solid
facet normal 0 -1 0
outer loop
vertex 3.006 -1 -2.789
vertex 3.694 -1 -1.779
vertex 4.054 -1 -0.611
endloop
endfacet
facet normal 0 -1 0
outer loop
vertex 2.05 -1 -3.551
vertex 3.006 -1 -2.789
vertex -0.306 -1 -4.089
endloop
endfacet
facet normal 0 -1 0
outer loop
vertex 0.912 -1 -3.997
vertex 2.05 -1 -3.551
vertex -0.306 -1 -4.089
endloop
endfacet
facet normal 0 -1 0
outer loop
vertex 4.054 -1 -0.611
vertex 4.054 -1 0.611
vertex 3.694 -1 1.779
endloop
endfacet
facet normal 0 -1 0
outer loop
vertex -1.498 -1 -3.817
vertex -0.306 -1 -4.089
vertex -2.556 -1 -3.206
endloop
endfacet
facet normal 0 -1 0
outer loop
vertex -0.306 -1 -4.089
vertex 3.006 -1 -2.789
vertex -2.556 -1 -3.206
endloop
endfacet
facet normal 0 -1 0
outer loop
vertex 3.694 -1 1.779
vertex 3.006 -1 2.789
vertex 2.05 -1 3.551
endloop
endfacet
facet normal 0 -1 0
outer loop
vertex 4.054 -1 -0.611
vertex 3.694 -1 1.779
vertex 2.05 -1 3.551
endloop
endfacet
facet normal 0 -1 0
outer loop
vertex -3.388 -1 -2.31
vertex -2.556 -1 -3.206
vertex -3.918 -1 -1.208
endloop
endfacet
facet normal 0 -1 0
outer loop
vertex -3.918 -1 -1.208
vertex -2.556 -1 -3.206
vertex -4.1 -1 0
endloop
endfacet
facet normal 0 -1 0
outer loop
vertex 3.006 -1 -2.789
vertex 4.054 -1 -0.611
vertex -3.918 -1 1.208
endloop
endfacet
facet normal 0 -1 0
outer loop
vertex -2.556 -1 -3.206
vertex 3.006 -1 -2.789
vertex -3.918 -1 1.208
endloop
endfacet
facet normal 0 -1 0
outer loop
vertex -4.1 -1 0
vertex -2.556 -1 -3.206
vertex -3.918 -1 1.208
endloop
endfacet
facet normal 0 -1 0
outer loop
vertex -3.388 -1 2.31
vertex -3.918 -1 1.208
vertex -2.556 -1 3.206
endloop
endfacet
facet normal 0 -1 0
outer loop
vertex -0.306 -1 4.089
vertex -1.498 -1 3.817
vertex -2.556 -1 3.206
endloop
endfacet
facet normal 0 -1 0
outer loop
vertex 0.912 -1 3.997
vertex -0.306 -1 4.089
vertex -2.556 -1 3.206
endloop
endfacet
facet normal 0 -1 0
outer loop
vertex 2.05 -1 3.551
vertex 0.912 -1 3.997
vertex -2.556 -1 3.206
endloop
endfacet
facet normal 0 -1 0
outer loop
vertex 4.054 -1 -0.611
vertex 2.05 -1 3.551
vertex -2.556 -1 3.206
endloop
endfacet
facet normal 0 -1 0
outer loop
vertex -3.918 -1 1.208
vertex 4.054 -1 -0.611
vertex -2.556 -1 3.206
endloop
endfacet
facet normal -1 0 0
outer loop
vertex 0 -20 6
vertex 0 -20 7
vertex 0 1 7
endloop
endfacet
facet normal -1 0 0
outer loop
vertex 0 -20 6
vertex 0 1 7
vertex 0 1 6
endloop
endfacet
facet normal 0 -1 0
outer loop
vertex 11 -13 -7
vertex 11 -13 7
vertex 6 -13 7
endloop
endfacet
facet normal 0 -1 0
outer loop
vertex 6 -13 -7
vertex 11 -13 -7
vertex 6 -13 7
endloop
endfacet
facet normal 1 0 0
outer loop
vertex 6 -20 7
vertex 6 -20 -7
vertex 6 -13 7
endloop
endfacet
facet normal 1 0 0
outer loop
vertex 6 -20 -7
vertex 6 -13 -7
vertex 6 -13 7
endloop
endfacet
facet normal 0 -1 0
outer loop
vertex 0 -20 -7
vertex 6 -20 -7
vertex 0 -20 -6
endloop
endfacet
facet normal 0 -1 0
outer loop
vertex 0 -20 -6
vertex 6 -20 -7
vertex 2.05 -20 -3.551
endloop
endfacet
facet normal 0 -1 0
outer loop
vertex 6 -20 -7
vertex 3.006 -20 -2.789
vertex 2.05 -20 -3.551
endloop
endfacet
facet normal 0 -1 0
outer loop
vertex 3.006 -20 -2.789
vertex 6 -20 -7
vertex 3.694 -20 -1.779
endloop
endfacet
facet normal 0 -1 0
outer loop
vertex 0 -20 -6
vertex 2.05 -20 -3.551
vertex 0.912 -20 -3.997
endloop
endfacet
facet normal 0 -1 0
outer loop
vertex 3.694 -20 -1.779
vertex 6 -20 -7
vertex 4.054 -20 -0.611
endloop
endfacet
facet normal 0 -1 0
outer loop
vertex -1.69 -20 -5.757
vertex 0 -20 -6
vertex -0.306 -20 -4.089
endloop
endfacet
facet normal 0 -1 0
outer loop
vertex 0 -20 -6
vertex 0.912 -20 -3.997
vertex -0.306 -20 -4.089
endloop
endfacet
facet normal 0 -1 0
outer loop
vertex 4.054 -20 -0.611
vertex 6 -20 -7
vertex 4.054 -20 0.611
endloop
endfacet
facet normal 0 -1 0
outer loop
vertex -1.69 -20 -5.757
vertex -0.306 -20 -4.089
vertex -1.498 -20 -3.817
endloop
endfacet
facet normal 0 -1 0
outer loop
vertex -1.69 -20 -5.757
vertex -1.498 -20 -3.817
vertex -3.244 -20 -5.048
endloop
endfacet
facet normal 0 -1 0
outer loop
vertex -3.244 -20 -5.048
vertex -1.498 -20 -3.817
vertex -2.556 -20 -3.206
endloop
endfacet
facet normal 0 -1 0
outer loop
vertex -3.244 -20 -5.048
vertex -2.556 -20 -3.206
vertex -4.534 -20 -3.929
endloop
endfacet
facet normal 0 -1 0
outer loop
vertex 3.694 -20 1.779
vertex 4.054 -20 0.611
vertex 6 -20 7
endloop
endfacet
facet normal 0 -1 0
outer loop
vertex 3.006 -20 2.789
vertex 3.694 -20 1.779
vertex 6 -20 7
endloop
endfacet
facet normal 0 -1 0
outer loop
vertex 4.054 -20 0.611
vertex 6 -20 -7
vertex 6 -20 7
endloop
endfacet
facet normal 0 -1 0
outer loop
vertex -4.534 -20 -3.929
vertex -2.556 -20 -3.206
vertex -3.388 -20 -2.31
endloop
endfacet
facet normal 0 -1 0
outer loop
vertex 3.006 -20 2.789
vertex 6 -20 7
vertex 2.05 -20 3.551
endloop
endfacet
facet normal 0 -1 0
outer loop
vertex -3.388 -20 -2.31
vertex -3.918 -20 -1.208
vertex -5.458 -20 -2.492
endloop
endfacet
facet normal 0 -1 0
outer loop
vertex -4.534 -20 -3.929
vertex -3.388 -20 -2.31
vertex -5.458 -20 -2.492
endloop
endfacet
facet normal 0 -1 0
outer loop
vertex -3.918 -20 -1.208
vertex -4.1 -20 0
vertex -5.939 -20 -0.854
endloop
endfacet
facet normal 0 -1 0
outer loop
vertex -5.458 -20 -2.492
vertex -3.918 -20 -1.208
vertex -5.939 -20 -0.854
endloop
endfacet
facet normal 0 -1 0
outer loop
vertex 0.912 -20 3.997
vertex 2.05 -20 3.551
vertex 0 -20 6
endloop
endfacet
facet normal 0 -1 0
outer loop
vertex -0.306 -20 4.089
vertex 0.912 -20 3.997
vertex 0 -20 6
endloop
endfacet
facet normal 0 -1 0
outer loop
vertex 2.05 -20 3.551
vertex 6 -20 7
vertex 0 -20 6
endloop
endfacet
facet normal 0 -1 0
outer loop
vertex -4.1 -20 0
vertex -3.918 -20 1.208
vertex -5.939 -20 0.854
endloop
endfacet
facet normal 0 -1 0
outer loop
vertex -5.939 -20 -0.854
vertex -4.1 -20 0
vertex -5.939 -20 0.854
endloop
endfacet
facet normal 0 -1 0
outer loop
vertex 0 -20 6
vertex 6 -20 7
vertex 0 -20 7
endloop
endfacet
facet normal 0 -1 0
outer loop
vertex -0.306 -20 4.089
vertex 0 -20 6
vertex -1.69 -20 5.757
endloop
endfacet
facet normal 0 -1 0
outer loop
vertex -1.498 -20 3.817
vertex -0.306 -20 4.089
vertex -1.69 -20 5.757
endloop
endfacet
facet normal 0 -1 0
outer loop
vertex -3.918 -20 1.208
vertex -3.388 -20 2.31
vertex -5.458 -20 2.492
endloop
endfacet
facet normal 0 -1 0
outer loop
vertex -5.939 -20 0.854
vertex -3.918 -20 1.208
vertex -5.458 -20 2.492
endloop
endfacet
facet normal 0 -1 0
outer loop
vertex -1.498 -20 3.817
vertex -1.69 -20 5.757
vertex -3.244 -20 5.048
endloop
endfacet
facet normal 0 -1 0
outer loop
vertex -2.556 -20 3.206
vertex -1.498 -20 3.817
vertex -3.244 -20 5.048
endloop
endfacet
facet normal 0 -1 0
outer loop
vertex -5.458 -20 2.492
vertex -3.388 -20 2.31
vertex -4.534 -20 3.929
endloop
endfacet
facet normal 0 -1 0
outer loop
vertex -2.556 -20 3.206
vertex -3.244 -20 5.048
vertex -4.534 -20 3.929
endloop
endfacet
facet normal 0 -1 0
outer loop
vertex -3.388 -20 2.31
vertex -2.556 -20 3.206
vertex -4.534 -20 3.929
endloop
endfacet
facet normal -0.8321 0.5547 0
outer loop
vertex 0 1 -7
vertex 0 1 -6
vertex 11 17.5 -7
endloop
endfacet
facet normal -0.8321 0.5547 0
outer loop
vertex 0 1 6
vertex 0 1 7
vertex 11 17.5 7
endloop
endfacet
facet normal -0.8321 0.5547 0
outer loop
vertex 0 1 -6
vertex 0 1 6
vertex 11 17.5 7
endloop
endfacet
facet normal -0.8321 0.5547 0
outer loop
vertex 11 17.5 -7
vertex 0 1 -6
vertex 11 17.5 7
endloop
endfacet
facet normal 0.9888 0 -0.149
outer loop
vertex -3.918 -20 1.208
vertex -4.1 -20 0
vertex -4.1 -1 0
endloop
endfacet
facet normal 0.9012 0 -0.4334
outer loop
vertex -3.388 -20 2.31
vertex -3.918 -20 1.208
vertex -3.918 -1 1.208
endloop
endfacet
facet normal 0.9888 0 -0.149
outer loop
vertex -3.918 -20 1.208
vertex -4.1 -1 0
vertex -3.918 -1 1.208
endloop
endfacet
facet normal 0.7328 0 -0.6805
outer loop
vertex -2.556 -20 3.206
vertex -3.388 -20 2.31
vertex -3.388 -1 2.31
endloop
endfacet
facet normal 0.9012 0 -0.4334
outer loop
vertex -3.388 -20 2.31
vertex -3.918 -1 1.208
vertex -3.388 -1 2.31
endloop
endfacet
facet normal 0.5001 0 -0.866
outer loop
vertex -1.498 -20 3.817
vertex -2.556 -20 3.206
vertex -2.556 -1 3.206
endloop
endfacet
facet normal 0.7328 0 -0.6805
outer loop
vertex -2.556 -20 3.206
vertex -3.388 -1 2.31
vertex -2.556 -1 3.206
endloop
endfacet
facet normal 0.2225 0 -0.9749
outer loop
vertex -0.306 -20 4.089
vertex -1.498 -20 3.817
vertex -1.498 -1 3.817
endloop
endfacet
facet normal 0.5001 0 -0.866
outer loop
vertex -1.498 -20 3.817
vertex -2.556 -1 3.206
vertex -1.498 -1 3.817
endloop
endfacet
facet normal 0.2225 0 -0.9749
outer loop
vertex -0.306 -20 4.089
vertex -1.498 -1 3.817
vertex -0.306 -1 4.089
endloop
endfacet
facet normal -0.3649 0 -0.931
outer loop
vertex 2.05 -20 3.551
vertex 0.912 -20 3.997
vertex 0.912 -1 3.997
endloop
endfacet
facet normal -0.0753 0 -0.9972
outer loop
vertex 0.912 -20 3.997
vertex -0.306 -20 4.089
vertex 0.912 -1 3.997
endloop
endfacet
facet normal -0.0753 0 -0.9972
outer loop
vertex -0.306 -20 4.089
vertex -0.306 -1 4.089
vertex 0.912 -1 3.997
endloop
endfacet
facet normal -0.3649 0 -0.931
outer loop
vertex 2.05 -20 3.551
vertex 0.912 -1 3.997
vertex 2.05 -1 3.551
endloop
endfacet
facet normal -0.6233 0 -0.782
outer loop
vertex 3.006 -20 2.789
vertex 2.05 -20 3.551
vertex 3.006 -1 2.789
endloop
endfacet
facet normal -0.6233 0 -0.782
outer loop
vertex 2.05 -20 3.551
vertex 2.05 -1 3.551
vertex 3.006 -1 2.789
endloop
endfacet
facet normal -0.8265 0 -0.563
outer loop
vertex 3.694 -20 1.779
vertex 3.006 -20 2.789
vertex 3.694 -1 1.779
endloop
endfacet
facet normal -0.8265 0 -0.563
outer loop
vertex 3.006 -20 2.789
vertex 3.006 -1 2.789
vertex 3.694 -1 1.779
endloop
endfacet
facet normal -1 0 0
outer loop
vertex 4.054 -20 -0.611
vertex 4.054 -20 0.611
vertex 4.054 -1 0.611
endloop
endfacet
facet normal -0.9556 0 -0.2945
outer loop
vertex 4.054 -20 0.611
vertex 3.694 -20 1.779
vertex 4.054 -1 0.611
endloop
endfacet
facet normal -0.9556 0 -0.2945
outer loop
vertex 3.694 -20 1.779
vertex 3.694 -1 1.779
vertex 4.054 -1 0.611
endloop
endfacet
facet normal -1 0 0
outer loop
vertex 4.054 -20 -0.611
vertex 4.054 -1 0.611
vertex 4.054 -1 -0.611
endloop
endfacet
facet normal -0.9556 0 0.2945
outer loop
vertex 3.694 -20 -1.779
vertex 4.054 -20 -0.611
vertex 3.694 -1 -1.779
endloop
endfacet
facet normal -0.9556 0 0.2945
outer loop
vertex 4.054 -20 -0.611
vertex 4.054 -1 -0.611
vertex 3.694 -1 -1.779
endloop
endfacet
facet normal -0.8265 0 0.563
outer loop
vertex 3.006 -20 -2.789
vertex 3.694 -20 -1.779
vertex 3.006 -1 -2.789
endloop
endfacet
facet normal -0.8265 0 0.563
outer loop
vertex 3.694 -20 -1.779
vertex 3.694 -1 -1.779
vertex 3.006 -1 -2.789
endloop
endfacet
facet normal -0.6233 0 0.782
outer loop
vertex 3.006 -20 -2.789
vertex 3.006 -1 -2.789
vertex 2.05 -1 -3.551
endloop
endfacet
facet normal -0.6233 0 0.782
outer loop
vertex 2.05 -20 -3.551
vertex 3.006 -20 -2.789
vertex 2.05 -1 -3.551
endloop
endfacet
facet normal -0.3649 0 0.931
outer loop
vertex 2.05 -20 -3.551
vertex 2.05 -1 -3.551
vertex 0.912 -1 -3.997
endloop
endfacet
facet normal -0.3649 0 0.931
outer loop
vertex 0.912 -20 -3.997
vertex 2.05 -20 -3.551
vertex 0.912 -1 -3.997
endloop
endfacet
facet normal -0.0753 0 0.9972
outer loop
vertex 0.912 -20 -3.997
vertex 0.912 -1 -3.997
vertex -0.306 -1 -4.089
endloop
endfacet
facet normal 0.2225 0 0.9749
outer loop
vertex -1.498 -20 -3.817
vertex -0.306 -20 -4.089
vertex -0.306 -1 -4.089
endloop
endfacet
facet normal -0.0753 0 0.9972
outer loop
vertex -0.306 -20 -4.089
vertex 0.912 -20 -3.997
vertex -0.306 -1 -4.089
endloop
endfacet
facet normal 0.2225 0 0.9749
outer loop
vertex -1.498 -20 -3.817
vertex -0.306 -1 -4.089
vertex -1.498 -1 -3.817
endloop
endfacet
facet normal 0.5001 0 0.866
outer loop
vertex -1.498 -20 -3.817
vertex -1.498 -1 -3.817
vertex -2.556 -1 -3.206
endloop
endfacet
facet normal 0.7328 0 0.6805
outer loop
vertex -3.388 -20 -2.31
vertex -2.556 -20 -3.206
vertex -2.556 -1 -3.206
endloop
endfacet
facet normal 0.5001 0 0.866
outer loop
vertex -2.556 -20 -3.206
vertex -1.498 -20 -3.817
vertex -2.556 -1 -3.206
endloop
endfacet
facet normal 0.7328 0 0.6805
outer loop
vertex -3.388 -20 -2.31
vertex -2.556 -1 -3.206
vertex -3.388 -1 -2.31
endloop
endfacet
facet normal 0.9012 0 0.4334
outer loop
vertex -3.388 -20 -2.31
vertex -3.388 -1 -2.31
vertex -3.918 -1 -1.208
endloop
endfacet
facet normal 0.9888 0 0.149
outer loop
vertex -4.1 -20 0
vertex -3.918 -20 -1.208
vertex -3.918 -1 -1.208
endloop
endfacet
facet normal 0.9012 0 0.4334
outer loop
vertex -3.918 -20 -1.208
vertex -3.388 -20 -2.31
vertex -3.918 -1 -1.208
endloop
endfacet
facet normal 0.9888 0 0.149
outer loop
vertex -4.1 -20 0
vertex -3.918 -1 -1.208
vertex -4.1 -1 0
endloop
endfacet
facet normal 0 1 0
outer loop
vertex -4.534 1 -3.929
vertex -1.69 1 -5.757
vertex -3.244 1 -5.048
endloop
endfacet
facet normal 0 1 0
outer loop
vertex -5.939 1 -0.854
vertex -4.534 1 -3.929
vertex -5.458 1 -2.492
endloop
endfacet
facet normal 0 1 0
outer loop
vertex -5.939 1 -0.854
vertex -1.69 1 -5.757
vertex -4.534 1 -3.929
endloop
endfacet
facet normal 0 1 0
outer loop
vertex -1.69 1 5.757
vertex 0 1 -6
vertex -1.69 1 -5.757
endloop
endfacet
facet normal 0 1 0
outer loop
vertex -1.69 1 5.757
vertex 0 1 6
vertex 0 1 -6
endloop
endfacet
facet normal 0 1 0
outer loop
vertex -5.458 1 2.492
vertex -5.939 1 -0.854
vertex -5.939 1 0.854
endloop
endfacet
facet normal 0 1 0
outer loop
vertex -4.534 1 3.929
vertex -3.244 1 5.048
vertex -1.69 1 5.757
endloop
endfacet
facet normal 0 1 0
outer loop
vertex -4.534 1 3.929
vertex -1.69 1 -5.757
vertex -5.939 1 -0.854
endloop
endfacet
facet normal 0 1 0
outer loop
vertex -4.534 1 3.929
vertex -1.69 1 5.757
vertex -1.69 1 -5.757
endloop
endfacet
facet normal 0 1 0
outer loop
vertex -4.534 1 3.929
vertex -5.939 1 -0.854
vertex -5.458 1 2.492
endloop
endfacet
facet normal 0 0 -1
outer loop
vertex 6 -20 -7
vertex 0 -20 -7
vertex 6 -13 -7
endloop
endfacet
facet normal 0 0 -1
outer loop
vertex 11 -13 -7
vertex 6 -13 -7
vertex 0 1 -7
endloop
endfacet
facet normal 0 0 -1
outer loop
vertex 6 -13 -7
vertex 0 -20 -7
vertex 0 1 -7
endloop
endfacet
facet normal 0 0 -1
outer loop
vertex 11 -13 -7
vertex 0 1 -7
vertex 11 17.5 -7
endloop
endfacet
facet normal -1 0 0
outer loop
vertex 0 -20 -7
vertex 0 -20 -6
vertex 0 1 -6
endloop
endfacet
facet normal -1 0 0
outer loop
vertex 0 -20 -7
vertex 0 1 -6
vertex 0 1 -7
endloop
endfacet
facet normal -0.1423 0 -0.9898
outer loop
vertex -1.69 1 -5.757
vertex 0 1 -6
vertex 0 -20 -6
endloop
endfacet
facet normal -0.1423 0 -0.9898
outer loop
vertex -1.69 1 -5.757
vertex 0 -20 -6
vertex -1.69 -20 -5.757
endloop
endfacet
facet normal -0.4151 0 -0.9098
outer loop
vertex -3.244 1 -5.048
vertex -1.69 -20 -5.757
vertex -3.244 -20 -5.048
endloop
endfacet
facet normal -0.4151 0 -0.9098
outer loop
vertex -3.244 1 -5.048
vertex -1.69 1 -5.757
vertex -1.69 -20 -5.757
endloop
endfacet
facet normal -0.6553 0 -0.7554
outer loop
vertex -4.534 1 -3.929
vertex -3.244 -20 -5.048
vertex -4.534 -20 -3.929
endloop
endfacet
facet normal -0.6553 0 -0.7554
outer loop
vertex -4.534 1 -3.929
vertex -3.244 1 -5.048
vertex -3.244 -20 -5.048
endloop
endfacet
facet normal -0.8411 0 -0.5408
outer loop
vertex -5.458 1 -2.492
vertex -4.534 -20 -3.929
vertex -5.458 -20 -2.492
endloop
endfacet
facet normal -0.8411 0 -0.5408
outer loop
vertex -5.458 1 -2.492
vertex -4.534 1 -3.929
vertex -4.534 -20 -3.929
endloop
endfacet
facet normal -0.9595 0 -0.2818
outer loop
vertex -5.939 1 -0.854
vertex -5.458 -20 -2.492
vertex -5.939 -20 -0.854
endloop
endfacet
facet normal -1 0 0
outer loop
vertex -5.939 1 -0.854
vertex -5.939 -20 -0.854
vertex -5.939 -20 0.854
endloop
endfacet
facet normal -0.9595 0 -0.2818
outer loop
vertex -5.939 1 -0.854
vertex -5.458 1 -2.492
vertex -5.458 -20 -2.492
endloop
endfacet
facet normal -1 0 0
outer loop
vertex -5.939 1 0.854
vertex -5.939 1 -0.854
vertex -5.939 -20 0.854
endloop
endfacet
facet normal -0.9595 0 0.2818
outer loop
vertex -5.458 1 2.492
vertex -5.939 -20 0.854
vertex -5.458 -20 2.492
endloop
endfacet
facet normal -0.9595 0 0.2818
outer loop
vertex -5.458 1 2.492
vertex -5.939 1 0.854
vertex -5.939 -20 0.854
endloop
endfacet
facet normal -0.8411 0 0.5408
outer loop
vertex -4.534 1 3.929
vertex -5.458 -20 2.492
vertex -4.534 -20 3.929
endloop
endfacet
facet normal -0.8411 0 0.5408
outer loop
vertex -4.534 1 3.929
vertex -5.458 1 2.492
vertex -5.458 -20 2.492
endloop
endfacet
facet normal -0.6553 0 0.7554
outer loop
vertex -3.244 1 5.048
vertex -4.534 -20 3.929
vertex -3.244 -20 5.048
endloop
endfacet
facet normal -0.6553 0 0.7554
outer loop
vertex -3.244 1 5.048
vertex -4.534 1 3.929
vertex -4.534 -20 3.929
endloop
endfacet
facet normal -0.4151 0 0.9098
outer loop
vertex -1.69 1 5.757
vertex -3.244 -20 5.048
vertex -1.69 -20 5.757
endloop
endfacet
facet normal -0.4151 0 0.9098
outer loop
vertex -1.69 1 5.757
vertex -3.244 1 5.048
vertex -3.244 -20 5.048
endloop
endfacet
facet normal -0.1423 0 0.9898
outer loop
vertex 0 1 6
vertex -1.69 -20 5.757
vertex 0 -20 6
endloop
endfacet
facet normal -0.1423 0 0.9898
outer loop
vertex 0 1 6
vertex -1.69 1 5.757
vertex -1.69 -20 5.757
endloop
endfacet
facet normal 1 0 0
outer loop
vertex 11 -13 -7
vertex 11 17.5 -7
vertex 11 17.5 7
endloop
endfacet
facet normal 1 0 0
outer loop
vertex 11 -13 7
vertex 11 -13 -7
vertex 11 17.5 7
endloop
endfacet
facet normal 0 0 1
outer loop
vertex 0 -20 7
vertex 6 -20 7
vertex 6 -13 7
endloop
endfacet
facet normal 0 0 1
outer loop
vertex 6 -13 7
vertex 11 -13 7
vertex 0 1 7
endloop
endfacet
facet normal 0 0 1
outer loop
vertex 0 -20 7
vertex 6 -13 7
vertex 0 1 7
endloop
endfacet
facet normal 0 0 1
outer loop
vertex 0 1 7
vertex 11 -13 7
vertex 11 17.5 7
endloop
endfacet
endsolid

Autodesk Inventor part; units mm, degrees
ref_plane "YZ Plane" through (0, 0, 0) normal (1, 0, 0) x (0, 1, 0)
ref_plane "XZ Plane" through (0, 0, 0) normal (0, 1, 0) x (-1, 0, 0)
ref_plane "XY Plane" through (0, 0, 0) normal (0, 0, 1) x (1, 0, 0)
sketch "Szkic1" plane through (0, 0, 0) normal (0, 1, 0) x (-1, 0, 0)
  circle A0 centre (0, 0) radius 4.1
  line L0 (0, 7) -> (0, -7)
  line L1 (0, -7) -> (-11, -7)
  line L2 (-11, -7) -> (-11, 7)
  line L3 (-11, 7) -> (0, 7)
  line L4 (-11, 7) -> (-6, 7)
  line L5 (-6, -7) -> (-11, -7)
  line L6 (-11, -7) -> (-11, 7)
  circle A1 centre (0, 0) radius 6
  line L7 (-6, -7) -> (-6, 7)
  point P0 (0, -6)
  point P1 (0, 6)
  point P2 (0, -4.1)
  point P3 (0, 4.1)
  point P4 (-6, 0)
  dimension "d0" = 8.2
  dimension "d1" = 14
  dimension "d2" = 11
  dimension "d3" = 7
  dimension "d6" = 0
  dimension "d7" = 5
  dimension "d8" = 12
  dimension "d15" = 5
extrude "Wyciągnięcie proste4" add sketch "Szkic1" against normal blind 20 contours A0 L0 A1 | A0 L0 A1
extrude "Wyciągnięcie proste5" add sketch "Szkic1" along normal mid plane 2 contours A0 L0 | A0 L0 A1 | L0 A0 | A0 L0 A1
extrude "Wyciągnięcie proste6" add sketch "Szkic1" along normal blind 1 contours A1 L7 L3 L0 | L0 L1 L7 A1
extrude "Wyciągnięcie proste7" add sketch "Szkic1" along normal blind 10 contours L7 L1 L2 L3
extrude "Wyciągnięcie proste8" add sketch "Szkic1" against normal blind 20 contours A1 L7 L3 L0 | L0 L1 L7 A1
extrude "Wyciągnięcie proste9" add sketch "Szkic1" against normal blind 13 contours L7 L1 L2 L3
sketch "Szkic5" plane through (0, -20, 7) normal (0, 0, 1) x (1, 0, 0)
  line L0 (6, 21) -> (0, 21) projected
  line L1 (6, 21) -> (6, 30) projected
  line L2 (0, 21) -> (6, 30)
  line L3 (6, 30) -> (11, 37.5)
  line L4 (11, 7) -> (11, 30) projected
  line L5 (11, 30) -> (11, 37.5)
  line L6 (11, 30) -> (6, 30)
  line L7 (6, 30) -> (6, 21)
  line L8 (6, 30) -> (6, 21)
  line L9 (0, 21) -> (6, 21)
  point P0 (0, 20)
extrude "Wyciągnięcie proste10" add sketch "Szkic5" against normal blind 14
properties part number "chwytak_rurki"
